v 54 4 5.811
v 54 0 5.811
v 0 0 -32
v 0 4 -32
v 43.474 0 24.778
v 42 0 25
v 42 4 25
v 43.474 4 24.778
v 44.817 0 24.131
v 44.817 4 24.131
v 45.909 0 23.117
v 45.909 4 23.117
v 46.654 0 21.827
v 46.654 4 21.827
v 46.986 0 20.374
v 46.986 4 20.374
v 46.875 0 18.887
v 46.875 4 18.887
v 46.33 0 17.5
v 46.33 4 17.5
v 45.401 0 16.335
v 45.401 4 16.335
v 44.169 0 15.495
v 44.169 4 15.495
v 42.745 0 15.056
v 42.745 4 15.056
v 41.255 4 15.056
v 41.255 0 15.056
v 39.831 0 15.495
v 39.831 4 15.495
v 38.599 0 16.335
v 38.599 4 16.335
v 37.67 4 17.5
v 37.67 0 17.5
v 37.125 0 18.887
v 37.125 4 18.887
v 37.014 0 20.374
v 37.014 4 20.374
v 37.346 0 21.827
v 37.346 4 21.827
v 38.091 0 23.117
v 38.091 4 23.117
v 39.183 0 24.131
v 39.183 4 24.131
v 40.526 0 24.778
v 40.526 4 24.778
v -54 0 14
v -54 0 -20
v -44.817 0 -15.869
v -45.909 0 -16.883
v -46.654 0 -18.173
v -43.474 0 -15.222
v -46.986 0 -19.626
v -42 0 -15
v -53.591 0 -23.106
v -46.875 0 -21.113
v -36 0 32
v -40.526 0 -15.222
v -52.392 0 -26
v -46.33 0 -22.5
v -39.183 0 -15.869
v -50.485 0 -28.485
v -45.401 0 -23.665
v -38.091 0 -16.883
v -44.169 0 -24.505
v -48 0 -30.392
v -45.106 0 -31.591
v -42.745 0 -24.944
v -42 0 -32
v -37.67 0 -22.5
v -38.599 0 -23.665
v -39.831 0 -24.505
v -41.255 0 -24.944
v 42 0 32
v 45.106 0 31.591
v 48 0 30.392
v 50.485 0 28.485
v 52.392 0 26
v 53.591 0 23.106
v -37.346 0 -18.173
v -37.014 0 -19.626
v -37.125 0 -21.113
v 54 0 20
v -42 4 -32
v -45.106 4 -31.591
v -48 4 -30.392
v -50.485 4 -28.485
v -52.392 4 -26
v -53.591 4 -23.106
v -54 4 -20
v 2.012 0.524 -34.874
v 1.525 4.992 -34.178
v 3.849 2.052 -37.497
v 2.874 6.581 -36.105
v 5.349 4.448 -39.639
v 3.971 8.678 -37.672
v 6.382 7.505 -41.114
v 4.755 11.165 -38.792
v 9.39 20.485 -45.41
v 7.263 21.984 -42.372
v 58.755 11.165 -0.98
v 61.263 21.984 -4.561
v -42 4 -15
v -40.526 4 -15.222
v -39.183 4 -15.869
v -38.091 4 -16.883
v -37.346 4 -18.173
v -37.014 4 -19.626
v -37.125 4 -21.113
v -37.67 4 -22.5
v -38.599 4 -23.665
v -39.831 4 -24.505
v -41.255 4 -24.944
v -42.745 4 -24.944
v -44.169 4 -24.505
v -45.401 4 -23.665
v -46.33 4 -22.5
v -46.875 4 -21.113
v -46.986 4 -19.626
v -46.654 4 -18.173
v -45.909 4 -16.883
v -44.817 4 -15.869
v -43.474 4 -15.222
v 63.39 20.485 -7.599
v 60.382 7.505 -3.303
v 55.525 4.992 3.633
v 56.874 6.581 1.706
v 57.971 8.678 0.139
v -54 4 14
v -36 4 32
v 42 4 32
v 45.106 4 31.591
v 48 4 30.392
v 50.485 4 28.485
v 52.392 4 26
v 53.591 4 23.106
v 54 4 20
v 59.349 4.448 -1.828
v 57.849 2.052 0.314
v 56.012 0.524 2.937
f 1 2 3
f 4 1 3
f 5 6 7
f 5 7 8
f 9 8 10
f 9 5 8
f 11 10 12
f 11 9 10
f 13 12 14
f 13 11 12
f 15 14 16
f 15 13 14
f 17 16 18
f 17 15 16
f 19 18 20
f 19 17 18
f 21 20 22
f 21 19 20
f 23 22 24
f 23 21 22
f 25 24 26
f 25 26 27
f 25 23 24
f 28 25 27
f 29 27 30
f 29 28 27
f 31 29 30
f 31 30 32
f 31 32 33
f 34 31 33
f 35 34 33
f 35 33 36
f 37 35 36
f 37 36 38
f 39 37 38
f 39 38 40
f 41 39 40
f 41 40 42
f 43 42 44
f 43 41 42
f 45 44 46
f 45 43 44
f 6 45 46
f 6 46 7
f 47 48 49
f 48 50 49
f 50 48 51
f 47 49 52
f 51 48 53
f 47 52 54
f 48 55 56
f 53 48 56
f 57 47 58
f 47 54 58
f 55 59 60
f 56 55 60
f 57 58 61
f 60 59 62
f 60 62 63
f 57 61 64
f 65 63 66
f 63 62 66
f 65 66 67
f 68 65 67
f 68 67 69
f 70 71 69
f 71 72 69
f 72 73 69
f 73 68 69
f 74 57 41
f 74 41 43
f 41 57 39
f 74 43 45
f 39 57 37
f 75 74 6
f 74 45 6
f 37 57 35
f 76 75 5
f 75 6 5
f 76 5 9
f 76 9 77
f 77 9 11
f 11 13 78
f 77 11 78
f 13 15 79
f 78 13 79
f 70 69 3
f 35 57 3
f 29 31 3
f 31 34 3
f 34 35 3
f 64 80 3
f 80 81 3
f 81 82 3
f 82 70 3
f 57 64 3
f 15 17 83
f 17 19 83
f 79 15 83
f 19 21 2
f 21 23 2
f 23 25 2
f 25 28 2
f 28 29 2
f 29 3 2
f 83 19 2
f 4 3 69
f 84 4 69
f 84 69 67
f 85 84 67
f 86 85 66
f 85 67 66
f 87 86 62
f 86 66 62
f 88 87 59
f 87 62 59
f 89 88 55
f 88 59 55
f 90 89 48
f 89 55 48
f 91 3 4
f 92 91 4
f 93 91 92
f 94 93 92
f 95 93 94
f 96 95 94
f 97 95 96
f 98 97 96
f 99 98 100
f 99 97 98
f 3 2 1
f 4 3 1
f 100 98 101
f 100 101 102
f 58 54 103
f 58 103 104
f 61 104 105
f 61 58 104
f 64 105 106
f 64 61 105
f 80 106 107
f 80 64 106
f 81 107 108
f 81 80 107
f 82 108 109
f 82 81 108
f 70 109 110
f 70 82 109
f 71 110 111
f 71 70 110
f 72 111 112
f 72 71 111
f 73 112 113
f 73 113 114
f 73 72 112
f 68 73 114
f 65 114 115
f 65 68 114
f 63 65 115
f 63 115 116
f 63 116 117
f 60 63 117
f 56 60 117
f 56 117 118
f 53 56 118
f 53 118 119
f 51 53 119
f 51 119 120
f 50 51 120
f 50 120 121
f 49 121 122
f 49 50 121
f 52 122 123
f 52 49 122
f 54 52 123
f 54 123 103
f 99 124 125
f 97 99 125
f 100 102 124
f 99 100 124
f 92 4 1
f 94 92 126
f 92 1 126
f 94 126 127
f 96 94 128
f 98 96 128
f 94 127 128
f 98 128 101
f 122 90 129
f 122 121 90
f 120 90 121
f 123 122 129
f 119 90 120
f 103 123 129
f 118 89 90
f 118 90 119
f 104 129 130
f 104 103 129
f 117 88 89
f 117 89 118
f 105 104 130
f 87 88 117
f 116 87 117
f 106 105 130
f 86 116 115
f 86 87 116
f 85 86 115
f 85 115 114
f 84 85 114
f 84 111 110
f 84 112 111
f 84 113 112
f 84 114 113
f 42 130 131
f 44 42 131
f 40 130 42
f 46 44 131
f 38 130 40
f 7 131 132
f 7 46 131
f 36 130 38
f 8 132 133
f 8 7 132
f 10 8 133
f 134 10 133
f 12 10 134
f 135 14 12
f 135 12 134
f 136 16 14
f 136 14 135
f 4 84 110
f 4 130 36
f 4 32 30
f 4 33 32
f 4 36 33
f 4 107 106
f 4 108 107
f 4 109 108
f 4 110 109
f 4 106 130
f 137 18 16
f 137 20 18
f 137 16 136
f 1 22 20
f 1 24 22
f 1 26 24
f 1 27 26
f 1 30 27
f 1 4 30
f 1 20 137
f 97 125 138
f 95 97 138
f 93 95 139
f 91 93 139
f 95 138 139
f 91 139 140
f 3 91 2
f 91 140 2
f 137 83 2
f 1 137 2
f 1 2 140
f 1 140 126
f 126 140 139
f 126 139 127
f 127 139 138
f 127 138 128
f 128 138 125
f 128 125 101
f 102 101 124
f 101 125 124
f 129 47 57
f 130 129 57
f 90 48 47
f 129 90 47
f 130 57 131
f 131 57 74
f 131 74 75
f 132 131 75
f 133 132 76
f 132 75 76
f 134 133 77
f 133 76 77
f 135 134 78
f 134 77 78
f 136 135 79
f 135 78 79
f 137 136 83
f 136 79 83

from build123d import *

# Parameters (mm, degrees)
SKETCH2_R           = 5
BOSS_EXTRUDE1_DEPTH = 4
BOSS_EXTRUDE2_DEPTH = 65.921828


with BuildPart() as part:
    # Sketch2 → Boss-Extrude1 (new body)
    with BuildSketch(Plane(origin=(0, 0, 0), x_dir=(1, 0, 0), z_dir=(0, 1, 0))):
        with BuildLine():
            Line((0, 32), (-42, 32))
            ThreePointArc((-42, 32), (-50.485281374, 28.485281374), (-54, 20))
            Line((-54, 20), (-54, -14))
            Line((-54, -14), (-36, -32))
            Line((-36, -32), (42, -32))
            ThreePointArc((42, -32), (50.485281374, -28.485281374), (54, -20))
            Line((54, -20), (54, -5.811207063))
            Line((54, -5.811207063), (0, 32))
        make_face()
        with Locations(Location((-42, 20, 0), (0, 0, 270))):
            Circle(SKETCH2_R, mode=Mode.SUBTRACT)
        with Locations(Location((42, -20, 0), (0, 0, 270))):
            Circle(SKETCH2_R, mode=Mode.SUBTRACT)
    extrude(amount=BOSS_EXTRUDE1_DEPTH)


with BuildPart() as body_2:
    # Sketch3 → Boss-Extrude2 (new body)
    with BuildSketch(Plane(origin=(38.964918067, 0, 27.283529357), x_dir=(0, -1, 0), z_dir=(0.8191520442889951, 0, 0.5735764363510414))):
        with BuildLine():
            Line((-11.16495341, 34.503762636), (-21.983721217, 38.874828562))
            Line((-21.983721217, 38.874828562), (-20.485294843, 42.58356398))
            Line((-20.485294843, 42.58356398), (-7.504720879, 37.339071672))
            ThreePointArc((-7.504720879, 37.339071672), (-2.051549129, 32.923180259), (0, 26.212865417))
            Line((0, 26.212865417), (-4, 26.212865417))
            ThreePointArc((-4, 26.212865417), (-6.580866729, 31.223900539), (-11.16495341, 34.503762636))
        make_face()
    extrude(amount=-BOSS_EXTRUDE2_DEPTH)


solid = Compound([part.part, body_2.part])
